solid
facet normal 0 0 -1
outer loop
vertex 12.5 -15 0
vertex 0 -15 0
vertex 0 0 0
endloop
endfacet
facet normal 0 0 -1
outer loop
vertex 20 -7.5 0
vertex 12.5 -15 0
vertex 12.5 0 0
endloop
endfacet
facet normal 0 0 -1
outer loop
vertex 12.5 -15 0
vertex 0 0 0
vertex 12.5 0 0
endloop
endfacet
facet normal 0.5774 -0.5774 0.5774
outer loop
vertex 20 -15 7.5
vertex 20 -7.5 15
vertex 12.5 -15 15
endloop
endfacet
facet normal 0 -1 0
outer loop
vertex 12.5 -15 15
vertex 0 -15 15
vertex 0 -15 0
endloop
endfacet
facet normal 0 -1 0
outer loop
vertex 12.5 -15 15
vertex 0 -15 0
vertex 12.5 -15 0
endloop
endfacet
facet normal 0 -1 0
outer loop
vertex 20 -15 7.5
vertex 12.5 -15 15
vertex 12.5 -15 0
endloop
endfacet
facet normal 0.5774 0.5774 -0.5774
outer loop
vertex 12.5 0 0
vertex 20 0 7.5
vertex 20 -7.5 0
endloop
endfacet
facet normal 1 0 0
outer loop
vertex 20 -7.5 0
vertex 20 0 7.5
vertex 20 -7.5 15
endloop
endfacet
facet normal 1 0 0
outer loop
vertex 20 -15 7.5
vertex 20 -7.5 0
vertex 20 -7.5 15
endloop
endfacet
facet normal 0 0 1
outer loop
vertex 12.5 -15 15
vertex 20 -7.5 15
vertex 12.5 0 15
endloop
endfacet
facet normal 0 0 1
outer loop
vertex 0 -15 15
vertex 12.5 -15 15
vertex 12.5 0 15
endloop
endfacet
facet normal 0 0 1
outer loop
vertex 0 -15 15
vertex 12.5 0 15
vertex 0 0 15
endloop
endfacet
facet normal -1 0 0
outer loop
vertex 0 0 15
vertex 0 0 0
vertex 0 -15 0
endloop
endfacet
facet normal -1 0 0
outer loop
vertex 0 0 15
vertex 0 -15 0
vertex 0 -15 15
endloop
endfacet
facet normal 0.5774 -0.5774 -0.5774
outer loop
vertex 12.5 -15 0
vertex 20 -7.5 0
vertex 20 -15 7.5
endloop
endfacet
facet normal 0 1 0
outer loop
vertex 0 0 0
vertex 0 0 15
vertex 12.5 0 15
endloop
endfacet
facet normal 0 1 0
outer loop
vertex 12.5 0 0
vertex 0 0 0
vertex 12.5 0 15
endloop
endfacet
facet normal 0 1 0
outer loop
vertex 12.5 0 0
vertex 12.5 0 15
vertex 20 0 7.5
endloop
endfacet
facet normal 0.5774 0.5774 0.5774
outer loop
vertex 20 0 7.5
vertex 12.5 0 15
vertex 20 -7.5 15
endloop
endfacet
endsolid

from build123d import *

# Parameters (mm, degrees)
F0_W      = 12.5
F0_H      = 15
F1_DEPTH  = 15
F7_DEPTH  = 25
F10_DEPTH = 43.5
F14_DEPTH = 25
F17_DEPTH = 25


with BuildPart() as f1:
    # F0 (on Front) → F1 (new body)
    with BuildSketch(Plane.XZ):
        with Locations((6.25, 7.5)):
            Rectangle(F0_W, F0_H)
        Polygon((20, 15), (12.5, 15), (20, 7.5), align=None)
        Polygon((20, 7.5), (12.5, 0), (20, 0), align=None)
        Polygon((20, 7.5), (12.5, 15), (12.5, 0), align=None)
    extrude(amount=F1_DEPTH)

    # F6 (on 3pt) → F7 (cut)
    with BuildSketch(Plane(origin=(9.1666666667, 9.1666666667, 9.1666666667), x_dir=(0.8164965809, -0.4082482905, -0.4082482905), z_dir=(-0.5773502692, -0.5773502692, -0.5773502692))):
        Polygon((4.0824829046, 10.6066017178), (13.2680694401, 5.3033008589), (13.2680694401, 15.9099025767), align=None)
    extrude(amount=-F7_DEPTH, mode=Mode.SUBTRACT)

    # F9 (on 3pt) → F10 (cut)
    with BuildSketch(Plane(origin=(4.1666666667, 4.1666666667, -4.1666666667), x_dir=(-0.8164965809, 0.4082482905, -0.4082482905), z_dir=(0.5773502692, 0.5773502692, -0.5773502692))):
        Polygon((-19.391793797, 5.3033008589), (-19.391793797, -5.3033008589), (-10.2062072616, 0), align=None)
    extrude(amount=F10_DEPTH, mode=Mode.SUBTRACT)

    # F13 (on 3pt) → F14 (cut)
    with BuildSketch(Plane(origin=(9.1666666667, -9.1666666667, -9.1666666667), x_dir=(-0.4082482905, -0.8164965809, 0.4082482905), z_dir=(-0.5773502692, 0.5773502692, 0.5773502692))):
        Polygon((-2.0412414523, 14.1421356237), (7.1443450831, 8.8388347648), (7.1443450831, 19.4454364826), align=None)
    extrude(amount=-F14_DEPTH, mode=Mode.SUBTRACT)

    # F16 (on 3pt) → F17 (cut)
    with BuildSketch(Plane(origin=(14.1666666667, -14.1666666667, 14.1666666667), x_dir=(-0.8164965809, -0.4082482905, 0.4082482905), z_dir=(-0.5773502692, 0.5773502692, -0.5773502692))):
        Polygon((2.0412414523, 0), (-7.1443450831, 5.3033008589), (-7.1443450831, -5.3033008589), align=None)
    extrude(amount=-F17_DEPTH, mode=Mode.SUBTRACT)


solid = f1.part
